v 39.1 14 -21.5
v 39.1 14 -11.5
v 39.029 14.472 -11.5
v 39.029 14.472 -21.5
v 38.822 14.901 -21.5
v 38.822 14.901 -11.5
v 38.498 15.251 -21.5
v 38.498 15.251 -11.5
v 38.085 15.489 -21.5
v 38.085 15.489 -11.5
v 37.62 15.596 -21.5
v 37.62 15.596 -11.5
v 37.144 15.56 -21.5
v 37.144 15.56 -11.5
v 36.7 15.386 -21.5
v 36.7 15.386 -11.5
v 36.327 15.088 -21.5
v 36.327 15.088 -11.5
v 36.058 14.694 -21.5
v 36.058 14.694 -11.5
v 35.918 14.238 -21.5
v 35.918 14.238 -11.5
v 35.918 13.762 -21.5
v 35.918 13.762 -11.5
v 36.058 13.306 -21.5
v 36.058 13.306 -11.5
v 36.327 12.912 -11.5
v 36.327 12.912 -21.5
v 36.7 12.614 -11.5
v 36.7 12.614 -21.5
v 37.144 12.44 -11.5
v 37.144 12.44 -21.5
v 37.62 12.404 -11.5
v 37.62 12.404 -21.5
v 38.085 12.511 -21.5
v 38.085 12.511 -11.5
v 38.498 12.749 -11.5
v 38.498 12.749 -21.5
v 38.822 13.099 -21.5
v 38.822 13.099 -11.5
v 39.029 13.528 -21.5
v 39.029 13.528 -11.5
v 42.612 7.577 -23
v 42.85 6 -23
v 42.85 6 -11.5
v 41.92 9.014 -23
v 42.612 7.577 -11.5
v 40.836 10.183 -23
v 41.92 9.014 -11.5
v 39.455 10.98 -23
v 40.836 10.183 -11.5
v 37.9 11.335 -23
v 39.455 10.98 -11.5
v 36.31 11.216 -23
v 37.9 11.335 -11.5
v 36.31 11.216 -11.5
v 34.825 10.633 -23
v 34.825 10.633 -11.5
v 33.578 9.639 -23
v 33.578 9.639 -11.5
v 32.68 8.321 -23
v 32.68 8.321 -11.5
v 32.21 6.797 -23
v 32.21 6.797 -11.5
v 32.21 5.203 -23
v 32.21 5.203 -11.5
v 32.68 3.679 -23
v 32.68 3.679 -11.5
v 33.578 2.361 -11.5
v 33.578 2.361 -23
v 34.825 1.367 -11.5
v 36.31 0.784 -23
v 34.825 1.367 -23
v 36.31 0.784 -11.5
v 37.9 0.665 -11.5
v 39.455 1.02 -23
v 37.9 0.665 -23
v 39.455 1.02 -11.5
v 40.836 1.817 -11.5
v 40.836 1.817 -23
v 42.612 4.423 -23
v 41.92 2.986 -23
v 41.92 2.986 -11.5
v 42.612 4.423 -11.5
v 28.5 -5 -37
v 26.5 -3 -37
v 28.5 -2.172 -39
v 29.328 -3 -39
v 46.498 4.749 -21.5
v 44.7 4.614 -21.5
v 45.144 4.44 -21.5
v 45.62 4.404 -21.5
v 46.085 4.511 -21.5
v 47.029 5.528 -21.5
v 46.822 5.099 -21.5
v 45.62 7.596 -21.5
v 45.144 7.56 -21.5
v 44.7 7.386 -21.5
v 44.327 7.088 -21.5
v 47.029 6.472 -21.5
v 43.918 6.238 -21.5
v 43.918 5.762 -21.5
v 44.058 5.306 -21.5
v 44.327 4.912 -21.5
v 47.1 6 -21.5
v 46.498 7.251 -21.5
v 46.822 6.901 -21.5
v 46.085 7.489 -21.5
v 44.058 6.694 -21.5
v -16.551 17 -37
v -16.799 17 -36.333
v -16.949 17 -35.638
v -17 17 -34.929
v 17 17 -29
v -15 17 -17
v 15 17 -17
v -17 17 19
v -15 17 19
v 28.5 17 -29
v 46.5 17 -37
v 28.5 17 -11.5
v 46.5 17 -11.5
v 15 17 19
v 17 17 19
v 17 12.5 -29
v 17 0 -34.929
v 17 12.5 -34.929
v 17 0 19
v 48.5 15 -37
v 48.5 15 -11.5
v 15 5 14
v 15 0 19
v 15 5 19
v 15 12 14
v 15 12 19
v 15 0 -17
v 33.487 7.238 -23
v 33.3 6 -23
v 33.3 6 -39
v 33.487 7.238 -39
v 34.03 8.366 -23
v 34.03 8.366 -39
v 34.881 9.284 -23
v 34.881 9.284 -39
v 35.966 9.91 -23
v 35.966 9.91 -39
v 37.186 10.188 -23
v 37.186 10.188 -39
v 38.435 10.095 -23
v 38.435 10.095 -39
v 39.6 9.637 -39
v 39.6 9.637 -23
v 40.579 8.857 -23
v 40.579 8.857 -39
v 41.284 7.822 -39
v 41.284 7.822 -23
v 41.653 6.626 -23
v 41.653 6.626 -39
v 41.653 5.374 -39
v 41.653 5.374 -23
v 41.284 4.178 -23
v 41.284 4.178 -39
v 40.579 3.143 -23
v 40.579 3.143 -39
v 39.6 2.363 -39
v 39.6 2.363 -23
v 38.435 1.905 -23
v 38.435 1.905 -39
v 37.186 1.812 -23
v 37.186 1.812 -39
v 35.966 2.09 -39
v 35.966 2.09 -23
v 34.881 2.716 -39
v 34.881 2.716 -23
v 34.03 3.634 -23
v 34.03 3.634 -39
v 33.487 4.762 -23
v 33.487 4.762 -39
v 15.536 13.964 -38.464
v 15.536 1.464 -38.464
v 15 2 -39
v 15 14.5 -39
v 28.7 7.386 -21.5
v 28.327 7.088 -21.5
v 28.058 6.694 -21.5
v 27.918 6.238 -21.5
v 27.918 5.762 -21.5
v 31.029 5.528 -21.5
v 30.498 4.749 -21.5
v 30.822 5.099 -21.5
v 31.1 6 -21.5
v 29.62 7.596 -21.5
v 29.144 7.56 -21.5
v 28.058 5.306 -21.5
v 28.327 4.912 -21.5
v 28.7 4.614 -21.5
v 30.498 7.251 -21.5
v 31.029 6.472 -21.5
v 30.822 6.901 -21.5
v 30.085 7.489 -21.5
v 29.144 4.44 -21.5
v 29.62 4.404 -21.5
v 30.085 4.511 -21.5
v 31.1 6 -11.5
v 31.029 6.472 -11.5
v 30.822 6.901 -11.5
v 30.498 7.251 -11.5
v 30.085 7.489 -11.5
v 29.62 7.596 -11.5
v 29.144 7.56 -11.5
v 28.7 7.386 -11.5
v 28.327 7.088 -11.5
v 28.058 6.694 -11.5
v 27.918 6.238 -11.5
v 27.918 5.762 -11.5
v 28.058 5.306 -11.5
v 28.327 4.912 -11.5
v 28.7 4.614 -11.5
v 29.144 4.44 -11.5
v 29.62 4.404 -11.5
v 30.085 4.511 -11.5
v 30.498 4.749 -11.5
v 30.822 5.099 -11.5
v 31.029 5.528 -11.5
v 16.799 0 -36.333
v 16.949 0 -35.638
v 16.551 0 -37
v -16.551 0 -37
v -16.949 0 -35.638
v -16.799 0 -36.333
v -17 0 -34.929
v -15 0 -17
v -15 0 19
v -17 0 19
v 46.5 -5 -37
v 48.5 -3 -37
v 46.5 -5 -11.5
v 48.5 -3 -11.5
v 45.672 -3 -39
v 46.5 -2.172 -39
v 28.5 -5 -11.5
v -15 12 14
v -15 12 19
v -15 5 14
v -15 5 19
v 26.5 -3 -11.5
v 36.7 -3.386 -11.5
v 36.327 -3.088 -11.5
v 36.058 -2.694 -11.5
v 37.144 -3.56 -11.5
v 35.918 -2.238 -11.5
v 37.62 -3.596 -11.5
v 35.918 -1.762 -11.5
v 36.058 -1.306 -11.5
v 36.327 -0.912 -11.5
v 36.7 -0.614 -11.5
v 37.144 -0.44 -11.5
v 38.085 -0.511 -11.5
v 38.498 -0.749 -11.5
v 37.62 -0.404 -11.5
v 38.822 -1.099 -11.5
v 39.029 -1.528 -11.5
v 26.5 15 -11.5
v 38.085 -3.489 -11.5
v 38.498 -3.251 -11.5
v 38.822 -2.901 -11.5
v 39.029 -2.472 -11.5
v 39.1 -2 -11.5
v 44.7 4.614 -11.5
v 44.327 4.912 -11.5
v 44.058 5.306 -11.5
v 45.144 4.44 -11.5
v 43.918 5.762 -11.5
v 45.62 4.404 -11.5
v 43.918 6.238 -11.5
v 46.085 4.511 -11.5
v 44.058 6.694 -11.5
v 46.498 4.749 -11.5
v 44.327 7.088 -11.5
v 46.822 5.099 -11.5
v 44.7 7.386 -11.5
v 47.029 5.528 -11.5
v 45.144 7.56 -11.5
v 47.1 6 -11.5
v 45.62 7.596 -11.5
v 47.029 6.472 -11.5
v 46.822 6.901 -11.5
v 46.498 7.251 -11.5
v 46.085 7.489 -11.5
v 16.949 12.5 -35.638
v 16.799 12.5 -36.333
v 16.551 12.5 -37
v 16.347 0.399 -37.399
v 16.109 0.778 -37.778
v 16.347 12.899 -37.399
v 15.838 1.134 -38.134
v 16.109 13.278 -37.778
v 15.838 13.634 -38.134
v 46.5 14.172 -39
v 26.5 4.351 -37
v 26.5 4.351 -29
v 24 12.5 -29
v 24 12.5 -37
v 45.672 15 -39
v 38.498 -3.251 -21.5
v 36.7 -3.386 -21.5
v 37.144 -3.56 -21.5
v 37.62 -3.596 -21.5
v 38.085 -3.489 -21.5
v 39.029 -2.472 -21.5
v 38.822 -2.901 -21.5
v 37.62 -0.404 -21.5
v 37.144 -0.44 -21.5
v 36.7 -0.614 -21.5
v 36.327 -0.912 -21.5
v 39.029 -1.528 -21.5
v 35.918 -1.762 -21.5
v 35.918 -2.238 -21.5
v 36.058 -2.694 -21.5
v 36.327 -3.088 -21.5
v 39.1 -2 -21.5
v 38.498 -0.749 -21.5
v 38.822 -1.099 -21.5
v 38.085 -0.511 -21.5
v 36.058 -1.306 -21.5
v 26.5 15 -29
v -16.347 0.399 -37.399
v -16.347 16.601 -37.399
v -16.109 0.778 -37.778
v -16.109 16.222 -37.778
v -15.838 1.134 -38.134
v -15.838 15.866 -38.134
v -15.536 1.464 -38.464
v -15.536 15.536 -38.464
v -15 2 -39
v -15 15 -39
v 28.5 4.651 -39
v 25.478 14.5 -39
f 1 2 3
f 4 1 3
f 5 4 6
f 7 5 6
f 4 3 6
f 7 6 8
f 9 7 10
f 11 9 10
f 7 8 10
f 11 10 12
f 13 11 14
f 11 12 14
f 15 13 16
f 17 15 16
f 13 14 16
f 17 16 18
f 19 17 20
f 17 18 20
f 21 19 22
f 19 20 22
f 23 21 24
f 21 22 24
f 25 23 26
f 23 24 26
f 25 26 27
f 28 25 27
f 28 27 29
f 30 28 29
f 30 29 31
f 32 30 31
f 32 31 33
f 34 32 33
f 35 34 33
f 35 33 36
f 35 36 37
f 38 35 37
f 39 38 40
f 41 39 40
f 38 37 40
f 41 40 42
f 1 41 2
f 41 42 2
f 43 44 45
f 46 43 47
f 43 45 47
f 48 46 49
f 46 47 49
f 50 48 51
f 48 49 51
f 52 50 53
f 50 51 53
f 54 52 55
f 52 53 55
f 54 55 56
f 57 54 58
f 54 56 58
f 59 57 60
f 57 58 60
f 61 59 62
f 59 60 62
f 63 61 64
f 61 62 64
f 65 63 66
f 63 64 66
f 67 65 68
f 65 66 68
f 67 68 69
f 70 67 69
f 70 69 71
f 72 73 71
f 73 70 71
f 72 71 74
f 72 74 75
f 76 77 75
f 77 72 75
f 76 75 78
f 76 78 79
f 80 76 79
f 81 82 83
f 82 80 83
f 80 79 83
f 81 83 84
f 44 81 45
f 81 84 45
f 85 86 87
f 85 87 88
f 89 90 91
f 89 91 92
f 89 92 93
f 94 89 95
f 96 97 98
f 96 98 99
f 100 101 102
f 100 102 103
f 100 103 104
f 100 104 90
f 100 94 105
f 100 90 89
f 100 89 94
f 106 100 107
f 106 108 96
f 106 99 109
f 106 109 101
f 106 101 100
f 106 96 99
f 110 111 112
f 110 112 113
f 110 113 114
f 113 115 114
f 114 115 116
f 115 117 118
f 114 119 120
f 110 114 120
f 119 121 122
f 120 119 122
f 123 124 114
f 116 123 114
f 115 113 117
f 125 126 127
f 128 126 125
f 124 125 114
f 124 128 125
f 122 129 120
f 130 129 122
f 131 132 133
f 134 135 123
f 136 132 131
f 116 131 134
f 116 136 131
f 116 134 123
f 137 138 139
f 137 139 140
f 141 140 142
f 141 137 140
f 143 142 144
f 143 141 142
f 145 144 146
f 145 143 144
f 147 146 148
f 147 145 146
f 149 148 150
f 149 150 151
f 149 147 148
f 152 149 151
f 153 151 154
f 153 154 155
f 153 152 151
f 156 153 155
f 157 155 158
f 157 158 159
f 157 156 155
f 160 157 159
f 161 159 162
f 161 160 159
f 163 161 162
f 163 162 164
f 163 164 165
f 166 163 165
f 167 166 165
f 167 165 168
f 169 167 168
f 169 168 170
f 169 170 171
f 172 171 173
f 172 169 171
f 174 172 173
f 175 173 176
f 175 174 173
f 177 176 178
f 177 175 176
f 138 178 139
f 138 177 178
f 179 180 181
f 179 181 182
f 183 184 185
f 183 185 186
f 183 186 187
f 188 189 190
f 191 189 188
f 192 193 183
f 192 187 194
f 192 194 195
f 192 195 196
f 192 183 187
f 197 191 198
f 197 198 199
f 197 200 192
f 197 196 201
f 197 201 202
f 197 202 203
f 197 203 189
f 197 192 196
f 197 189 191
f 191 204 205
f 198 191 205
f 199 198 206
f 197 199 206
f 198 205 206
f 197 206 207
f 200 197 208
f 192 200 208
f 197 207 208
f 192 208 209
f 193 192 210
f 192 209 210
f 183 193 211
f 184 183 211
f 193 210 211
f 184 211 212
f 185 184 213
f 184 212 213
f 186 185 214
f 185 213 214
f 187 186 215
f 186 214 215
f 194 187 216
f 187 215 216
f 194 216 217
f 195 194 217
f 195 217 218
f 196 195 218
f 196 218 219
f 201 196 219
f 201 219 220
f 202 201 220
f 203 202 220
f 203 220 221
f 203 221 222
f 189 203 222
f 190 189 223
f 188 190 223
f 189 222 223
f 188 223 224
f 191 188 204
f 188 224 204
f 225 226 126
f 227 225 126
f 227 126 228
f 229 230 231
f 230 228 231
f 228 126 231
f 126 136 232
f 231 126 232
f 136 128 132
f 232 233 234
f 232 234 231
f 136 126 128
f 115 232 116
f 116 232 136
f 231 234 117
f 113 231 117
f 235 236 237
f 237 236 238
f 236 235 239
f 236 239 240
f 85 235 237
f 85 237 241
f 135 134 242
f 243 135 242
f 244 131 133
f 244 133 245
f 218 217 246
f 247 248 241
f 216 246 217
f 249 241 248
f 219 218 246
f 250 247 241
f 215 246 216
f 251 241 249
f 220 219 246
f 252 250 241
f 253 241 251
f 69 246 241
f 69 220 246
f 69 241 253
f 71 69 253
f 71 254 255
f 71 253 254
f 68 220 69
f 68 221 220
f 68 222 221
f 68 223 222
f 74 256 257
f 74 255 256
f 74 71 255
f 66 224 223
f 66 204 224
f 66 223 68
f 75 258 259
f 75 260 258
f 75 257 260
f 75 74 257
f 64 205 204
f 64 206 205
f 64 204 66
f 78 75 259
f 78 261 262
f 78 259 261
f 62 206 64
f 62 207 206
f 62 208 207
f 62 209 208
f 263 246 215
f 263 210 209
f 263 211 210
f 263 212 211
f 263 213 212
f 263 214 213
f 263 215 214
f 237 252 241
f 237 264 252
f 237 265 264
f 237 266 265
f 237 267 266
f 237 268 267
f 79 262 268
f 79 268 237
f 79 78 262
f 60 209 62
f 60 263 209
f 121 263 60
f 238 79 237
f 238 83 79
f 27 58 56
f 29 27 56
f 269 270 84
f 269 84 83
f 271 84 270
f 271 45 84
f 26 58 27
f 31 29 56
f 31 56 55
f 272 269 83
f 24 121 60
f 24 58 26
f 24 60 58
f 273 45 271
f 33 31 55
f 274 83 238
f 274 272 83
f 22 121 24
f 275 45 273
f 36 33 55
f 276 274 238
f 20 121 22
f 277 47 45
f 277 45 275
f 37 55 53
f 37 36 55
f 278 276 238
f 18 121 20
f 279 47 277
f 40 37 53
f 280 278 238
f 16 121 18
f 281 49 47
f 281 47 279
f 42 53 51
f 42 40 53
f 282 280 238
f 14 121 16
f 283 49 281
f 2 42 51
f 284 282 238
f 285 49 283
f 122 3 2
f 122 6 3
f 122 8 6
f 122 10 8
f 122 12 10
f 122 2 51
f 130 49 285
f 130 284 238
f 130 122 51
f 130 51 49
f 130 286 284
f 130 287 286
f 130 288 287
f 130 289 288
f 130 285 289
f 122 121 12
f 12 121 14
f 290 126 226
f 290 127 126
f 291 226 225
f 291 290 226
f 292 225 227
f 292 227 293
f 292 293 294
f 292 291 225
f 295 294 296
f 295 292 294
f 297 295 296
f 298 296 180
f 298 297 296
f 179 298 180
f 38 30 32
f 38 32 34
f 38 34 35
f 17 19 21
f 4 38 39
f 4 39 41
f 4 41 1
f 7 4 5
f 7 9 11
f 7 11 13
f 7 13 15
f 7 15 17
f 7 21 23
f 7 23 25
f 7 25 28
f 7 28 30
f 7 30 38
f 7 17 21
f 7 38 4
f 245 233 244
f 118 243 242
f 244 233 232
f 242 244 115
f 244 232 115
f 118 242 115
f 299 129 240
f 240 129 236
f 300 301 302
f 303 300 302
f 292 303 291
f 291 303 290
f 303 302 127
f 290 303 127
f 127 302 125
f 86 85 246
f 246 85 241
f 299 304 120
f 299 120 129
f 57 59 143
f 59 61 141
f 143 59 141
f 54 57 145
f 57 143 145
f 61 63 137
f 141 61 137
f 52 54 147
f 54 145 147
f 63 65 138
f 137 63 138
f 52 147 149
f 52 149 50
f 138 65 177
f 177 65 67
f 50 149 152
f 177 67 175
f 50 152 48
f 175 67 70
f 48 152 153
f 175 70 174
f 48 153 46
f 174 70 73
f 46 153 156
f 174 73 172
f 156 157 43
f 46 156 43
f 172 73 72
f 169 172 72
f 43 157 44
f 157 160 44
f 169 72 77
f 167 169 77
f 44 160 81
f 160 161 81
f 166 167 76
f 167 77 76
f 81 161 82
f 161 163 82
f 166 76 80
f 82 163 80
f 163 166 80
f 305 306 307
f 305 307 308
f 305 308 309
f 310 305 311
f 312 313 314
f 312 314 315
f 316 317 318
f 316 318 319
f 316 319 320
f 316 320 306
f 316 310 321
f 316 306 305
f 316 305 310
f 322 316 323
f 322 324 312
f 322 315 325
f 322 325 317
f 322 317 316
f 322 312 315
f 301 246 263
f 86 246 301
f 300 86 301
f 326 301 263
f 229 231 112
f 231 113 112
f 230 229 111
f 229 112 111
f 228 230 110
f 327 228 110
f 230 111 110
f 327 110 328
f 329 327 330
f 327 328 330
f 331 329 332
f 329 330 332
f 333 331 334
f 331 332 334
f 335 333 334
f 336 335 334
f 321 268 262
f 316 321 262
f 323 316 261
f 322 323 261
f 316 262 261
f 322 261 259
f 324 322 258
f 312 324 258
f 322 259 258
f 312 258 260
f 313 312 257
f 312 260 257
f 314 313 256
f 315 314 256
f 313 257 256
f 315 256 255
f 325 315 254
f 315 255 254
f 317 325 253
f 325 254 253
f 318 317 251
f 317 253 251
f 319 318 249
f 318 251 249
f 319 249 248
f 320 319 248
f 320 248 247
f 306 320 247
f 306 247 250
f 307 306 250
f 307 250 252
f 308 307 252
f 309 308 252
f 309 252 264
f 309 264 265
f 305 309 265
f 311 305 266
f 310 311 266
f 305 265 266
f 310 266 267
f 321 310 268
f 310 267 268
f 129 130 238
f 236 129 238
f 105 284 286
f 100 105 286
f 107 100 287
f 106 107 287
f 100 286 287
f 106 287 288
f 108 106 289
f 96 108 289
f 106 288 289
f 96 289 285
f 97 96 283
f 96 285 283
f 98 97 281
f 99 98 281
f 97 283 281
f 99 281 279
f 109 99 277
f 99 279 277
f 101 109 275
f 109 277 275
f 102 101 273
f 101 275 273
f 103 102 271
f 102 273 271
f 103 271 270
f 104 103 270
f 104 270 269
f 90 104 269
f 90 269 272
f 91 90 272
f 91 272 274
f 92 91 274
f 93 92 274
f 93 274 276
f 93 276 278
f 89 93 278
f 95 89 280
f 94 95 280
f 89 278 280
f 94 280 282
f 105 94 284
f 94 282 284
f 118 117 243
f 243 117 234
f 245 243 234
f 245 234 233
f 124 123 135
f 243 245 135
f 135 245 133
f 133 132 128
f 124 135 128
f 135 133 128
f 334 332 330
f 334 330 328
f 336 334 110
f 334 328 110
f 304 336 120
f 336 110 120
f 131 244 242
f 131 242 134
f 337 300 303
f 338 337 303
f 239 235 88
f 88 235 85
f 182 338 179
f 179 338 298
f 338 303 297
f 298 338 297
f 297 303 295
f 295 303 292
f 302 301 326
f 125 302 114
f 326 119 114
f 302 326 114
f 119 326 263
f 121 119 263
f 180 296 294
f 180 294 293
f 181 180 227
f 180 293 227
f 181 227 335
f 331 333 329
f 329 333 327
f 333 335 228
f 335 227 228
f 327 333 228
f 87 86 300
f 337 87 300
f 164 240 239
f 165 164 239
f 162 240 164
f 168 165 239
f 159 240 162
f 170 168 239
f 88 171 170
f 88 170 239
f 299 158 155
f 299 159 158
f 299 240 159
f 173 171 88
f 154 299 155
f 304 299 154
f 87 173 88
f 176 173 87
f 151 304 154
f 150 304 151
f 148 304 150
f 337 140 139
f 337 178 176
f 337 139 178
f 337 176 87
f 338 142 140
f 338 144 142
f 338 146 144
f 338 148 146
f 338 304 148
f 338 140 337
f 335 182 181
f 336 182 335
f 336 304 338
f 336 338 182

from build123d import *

# Parameters (mm, degrees)
SZKIC2_W                    = 34
SZKIC2_H                    = 38
SZKIC2_W_2                  = 30
SZKIC2_H_2                  = 31
DODANIE_WYCI_GNI_CIE1_DEPTH = 17
SZKIC6_W                    = 30
SZKIC6_H                    = 5
WYTNIJ_WYCI_GNI_CIE1_DEPTH  = 17
SZKIC7_W                    = 34
SZKIC7_H                    = 17
DODANIE_WYCI_GNI_CIE2_DEPTH = 10
SZKIC8_R                    = 11
SZKIC8_R_2                  = 5.35
SZKIC8_W                    = 7
SZKIC8_H                    = 4.5
SZKIC8_W_2                  = 34
SZKIC8_H_2                  = 17
DODANIE_WYCI_GNI_CIE3_DEPTH = 10
DODANIE_WYCI_GNI_CIE4_START = 17.5
SZKIC10_R                   = 11
SZKIC10_R_2                 = 5.35
DODANIE_WYCI_GNI_CIE4_DEPTH = 17.5
DODANIE_WYCI_GNI_CIE5_START = -16
SZKIC11_R                   = 5.35
SZKIC11_R_2                 = 4.2
DODANIE_WYCI_GNI_CIE5_DEPTH = 16
SZKIC13_R                   = 1.6
WYTNIJ_WYCI_GNI_CIE2_DEPTH  = 10
DODANIE_WYCI_GNI_CIE6_REACH = 79.494
SFAZOWANIE1_SIZE            = 2
SFAZOWANIE2_SIZE            = 2
SFAZOWANIE3_SIZE            = 2
ZAOKR_GLENIE1_R             = 5


with BuildPart() as part:
    # Szkic2 → Dodanie-wyciągnięcie1 (new body)
    with BuildSketch(Plane(origin=(0, 0, 0), x_dir=(1, 0, 0), z_dir=(0, 1, 0))):
        Rectangle(SZKIC2_W, SZKIC2_H)
        with Locations((0, 1.5)):
            Rectangle(SZKIC2_W_2, SZKIC2_H_2, mode=Mode.SUBTRACT)
    extrude(amount=DODANIE_WYCI_GNI_CIE1_DEPTH)

    # Szkic6 → Wytnij-wyciągnięcie1 (cut)
    with BuildSketch(Plane(origin=(0, 0, 14), x_dir=(-1, 0, 0), z_dir=(0, 0, -1))):
        with Locations((0, 14.5)):
            Rectangle(SZKIC6_W, SZKIC6_H)
        with Locations((0, 2.5)):
            Rectangle(SZKIC6_W, SZKIC6_H)
    extrude(amount=-WYTNIJ_WYCI_GNI_CIE1_DEPTH, mode=Mode.SUBTRACT)

    # Szkic7 → Dodanie-wyciągnięcie2 (add)
    with BuildSketch(Plane(origin=(0, 0, -19), x_dir=(-1, 0, 0), z_dir=(0, 0, -1))):
        with Locations((0, 8.5)):
            Rectangle(SZKIC7_W, SZKIC7_H)
    extrude(amount=DODANIE_WYCI_GNI_CIE2_DEPTH)

    # Szkic8 → Dodanie-wyciągnięcie3 (add)
    # profile 1 of 4: a face of its own
    with BuildSketch(Plane(origin=(0, 0, -29), x_dir=(-1, 0, 0), z_dir=(0, 0, -1))):
        with Locations((-37.5, 6)):
            Circle(SZKIC8_R)
        with Locations((-37.5, 6)):
            Circle(SZKIC8_R_2, mode=Mode.SUBTRACT)
    # profile 2 of 4: a face of its own
    with BuildSketch(Plane(origin=(0, 0, -29), x_dir=(-1, 0, 0), z_dir=(0, 0, -1))):
        with BuildLine():
            Line((-24, 12.5), (-24, 17))
            Line((-24, 17), (-37.5, 17))
            ThreePointArc((-37.5, 17), (-29.721825407, 13.778174593), (-26.5, 6))
            ThreePointArc((-26.5, 6), (-26.621602105, 4.368908572), (-26.983719863, 2.773879716))
            Line((-26.983719863, 2.773879716), (-24, 12.5))
        make_face()
    # profile 3 of 4: a face of its own
    with BuildSketch(Plane(origin=(0, 0, -29), x_dir=(-1, 0, 0), z_dir=(0, 0, -1))):
        with Locations((-20.5, 14.75)):
            Rectangle(SZKIC8_W, SZKIC8_H)
    # profile 4 of 4: a face of its own
    with BuildSketch(Plane(origin=(0, 0, -29), x_dir=(-1, 0, 0), z_dir=(0, 0, -1))):
        with Locations((0, 8.5)):
            Rectangle(SZKIC8_W_2, SZKIC8_H_2)
    extrude(amount=DODANIE_WYCI_GNI_CIE3_DEPTH)

    # Szkic10 → Dodanie-wyciągnięcie4 (add)
    with BuildSketch(Plane.XY.offset(-29).offset(DODANIE_WYCI_GNI_CIE4_START)):
        with Locations((37.5, 6)):
            Circle(SZKIC10_R)
        with Locations((37.5, 6)):
            Circle(SZKIC10_R_2, mode=Mode.SUBTRACT)
    extrude(amount=-DODANIE_WYCI_GNI_CIE4_DEPTH)

    # Szkic11 → Dodanie-wyciągnięcie5 (add)
    with BuildSketch(Plane(origin=(0, 0, -39), x_dir=(-1, 0, 0), z_dir=(0, 0, -1)).offset(DODANIE_WYCI_GNI_CIE5_START)):
        with Locations(Location((-37.5, 6, 0), (0, 0, 180))):
            Circle(SZKIC11_R)
        with Locations((-37.5, 6)):
            Circle(SZKIC11_R_2, mode=Mode.SUBTRACT)
    extrude(amount=DODANIE_WYCI_GNI_CIE5_DEPTH)

    # Szkic13 → Wytnij-wyciągnięcie2 (cut)
    with BuildSketch(Plane.XY.offset(-11.5)):
        with Locations((37.5, 14)):
            Circle(SZKIC13_R)
        with Locations((45.5, 6)):
            Circle(SZKIC13_R)
        with Locations((37.5, -2)):
            Circle(SZKIC13_R)
        with Locations((29.5, 6)):
            Circle(SZKIC13_R)
    extrude(amount=-WYTNIJ_WYCI_GNI_CIE2_DEPTH, mode=Mode.SUBTRACT)

    # Dodanie-wyciągnięcie6: up to this face of the body (flat: up to its plane)
    dodanie_wyci_gni_cie6_end = Plane(part.part.faces().sort_by_distance((26.811126984, 6, -11.5))[0])
    # Szkic16 → Dodanie-wyciągnięcie6 (add, up to the picked face)
    with BuildSketch(Plane(origin=(0, 0, -39), x_dir=(-1, 0, 0), z_dir=(0, 0, -1)), mode=Mode.PRIVATE) as dodanie_wyci_gni_cie6_sk1:
        with BuildLine():
            ThreePointArc((-48.5, 6), (-45.278174593, 13.778174593), (-37.5, 17))
            Line((-37.5, 17), (-48.5, 17))
            Line((-48.5, 17), (-48.5, 6))
        make_face()
    dodanie_wyci_gni_cie6_tool1 = split(extrude(dodanie_wyci_gni_cie6_sk1.sketch, amount=-DODANIE_WYCI_GNI_CIE6_REACH, mode=Mode.PRIVATE), bisect_by=dodanie_wyci_gni_cie6_end, keep=Keep.BOTH, mode=Mode.PRIVATE)
    # Szkic16 → Dodanie-wyciągnięcie6 (add, up to the picked face)
    with BuildSketch(Plane(origin=(0, 0, -39), x_dir=(-1, 0, 0), z_dir=(0, 0, -1)), mode=Mode.PRIVATE) as dodanie_wyci_gni_cie6_sk2:
        with BuildLine():
            Line((-26.5, 6), (-26.5, 17))
            Line((-26.5, 17), (-37.5, 17))
            ThreePointArc((-37.5, 17), (-29.721825407, 13.778174593), (-26.5, 6))
        make_face()
    dodanie_wyci_gni_cie6_tool2 = split(extrude(dodanie_wyci_gni_cie6_sk2.sketch, amount=-DODANIE_WYCI_GNI_CIE6_REACH, mode=Mode.PRIVATE), bisect_by=dodanie_wyci_gni_cie6_end, keep=Keep.BOTH, mode=Mode.PRIVATE)
    # Szkic16 → Dodanie-wyciągnięcie6 (add, up to the picked face)
    with BuildSketch(Plane(origin=(0, 0, -39), x_dir=(-1, 0, 0), z_dir=(0, 0, -1)), mode=Mode.PRIVATE) as dodanie_wyci_gni_cie6_sk3:
        with BuildLine():
            Line((-26.5, -5), (-26.5, 4.350675726))
            Line((-26.5, 4.350675726), (-26.983719863, 2.773879716))
            ThreePointArc((-26.983719863, 2.773879716), (-30.96116689, -2.84554473), (-37.5, -5))
            Line((-37.5, -5), (-26.5, -5))
        make_face()
    dodanie_wyci_gni_cie6_tool3 = split(extrude(dodanie_wyci_gni_cie6_sk3.sketch, amount=-DODANIE_WYCI_GNI_CIE6_REACH, mode=Mode.PRIVATE), bisect_by=dodanie_wyci_gni_cie6_end, keep=Keep.BOTH, mode=Mode.PRIVATE)
    # Szkic16 → Dodanie-wyciągnięcie6 (add, up to the picked face)
    with BuildSketch(Plane(origin=(0, 0, -39), x_dir=(-1, 0, 0), z_dir=(0, 0, -1)), mode=Mode.PRIVATE) as dodanie_wyci_gni_cie6_sk4:
        with BuildLine():
            ThreePointArc((-37.5, -5), (-45.278174593, -1.778174593), (-48.5, 6))
            Line((-48.5, 6), (-48.5, -5))
            Line((-48.5, -5), (-37.5, -5))
        make_face()
    dodanie_wyci_gni_cie6_tool4 = split(extrude(dodanie_wyci_gni_cie6_sk4.sketch, amount=-DODANIE_WYCI_GNI_CIE6_REACH, mode=Mode.PRIVATE), bisect_by=dodanie_wyci_gni_cie6_end, keep=Keep.BOTH, mode=Mode.PRIVATE)
    # Szkic16 → Dodanie-wyciągnięcie6 (add, up to the picked face)
    with BuildSketch(Plane(origin=(0, 0, -39), x_dir=(-1, 0, 0), z_dir=(0, 0, -1)), mode=Mode.PRIVATE) as dodanie_wyci_gni_cie6_sk5:
        with BuildLine():
            Line((-26.5, 4.350675726), (-26.5, 6))
            ThreePointArc((-26.5, 6), (-26.621602105, 4.368908572), (-26.983719863, 2.773879716))
            Line((-26.983719863, 2.773879716), (-26.5, 4.350675726))
        make_face()
    dodanie_wyci_gni_cie6_tool5 = split(extrude(dodanie_wyci_gni_cie6_sk5.sketch, amount=-DODANIE_WYCI_GNI_CIE6_REACH, mode=Mode.PRIVATE), bisect_by=dodanie_wyci_gni_cie6_end, keep=Keep.BOTH, mode=Mode.PRIVATE)
    add(dodanie_wyci_gni_cie6_tool1.solids().sort_by(Axis((46.042953, 14.542953, -39), (0, 0, 1)))[0])
    add(dodanie_wyci_gni_cie6_tool2.solids().sort_by(Axis((28.957047, 14.542953, -39), (0, 0, 1)))[0])
    add(dodanie_wyci_gni_cie6_tool3.solids().sort_by(Axis((28.969303, -2.578828, -39), (0, 0, 1)))[0])
    add(dodanie_wyci_gni_cie6_tool4.solids().sort_by(Axis((46.042953, -2.542953, -39), (0, 0, 1)))[0])
    add(dodanie_wyci_gni_cie6_tool5.solids().sort_by(Axis((26.597113, 4.365237, -39), (0, 0, 1)))[0])

    # Sfazowanie1
    sfazowanie1_edges = [part.edges().sort_by_distance(p)[0] for p in [
        (48.5, 17, -25.25),
        (26.5, 17, -20.25),
        (48.5, -5, -25.25),
        (26.5, -5, -25.25),
    ]]
    chamfer(sfazowanie1_edges, length=SFAZOWANIE1_SIZE)

    # Sfazowanie2
    sfazowanie2_edges = [part.edges().sort_by_distance(p)[0] for p in [
        (17, 6.25, -39),
        (0, 0, -39),
        (-17, 8.5, -39),
    ]]
    chamfer(sfazowanie2_edges, length=SFAZOWANIE2_SIZE)

    # Sfazowanie3
    sfazowanie3_edges = [part.edges().sort_by_distance(p)[0] for p in [
        (19.5, 12.5, -39),
        (15.75, 17, -39),
        (47.5, 16, -39),
        (48.5, 6, -39),
        (47.5, -4, -39),
        (37.5, -5, -39),
        (27.5, -4, -39),
        (26.5, 0.675337863, -39),
        (25.25, 8.425337863, -39),
    ]]
    chamfer(sfazowanie3_edges, length=SFAZOWANIE3_SIZE)

    # Zaokrąglenie1
    zaokr_glenie1_edges = [part.edges().sort_by_distance(p)[0] for p in [
        (17, 6.25, -37),
        (-17, 8.5, -37),
    ]]
    fillet(zaokr_glenie1_edges, radius=ZAOKR_GLENIE1_R)


solid = part.part
